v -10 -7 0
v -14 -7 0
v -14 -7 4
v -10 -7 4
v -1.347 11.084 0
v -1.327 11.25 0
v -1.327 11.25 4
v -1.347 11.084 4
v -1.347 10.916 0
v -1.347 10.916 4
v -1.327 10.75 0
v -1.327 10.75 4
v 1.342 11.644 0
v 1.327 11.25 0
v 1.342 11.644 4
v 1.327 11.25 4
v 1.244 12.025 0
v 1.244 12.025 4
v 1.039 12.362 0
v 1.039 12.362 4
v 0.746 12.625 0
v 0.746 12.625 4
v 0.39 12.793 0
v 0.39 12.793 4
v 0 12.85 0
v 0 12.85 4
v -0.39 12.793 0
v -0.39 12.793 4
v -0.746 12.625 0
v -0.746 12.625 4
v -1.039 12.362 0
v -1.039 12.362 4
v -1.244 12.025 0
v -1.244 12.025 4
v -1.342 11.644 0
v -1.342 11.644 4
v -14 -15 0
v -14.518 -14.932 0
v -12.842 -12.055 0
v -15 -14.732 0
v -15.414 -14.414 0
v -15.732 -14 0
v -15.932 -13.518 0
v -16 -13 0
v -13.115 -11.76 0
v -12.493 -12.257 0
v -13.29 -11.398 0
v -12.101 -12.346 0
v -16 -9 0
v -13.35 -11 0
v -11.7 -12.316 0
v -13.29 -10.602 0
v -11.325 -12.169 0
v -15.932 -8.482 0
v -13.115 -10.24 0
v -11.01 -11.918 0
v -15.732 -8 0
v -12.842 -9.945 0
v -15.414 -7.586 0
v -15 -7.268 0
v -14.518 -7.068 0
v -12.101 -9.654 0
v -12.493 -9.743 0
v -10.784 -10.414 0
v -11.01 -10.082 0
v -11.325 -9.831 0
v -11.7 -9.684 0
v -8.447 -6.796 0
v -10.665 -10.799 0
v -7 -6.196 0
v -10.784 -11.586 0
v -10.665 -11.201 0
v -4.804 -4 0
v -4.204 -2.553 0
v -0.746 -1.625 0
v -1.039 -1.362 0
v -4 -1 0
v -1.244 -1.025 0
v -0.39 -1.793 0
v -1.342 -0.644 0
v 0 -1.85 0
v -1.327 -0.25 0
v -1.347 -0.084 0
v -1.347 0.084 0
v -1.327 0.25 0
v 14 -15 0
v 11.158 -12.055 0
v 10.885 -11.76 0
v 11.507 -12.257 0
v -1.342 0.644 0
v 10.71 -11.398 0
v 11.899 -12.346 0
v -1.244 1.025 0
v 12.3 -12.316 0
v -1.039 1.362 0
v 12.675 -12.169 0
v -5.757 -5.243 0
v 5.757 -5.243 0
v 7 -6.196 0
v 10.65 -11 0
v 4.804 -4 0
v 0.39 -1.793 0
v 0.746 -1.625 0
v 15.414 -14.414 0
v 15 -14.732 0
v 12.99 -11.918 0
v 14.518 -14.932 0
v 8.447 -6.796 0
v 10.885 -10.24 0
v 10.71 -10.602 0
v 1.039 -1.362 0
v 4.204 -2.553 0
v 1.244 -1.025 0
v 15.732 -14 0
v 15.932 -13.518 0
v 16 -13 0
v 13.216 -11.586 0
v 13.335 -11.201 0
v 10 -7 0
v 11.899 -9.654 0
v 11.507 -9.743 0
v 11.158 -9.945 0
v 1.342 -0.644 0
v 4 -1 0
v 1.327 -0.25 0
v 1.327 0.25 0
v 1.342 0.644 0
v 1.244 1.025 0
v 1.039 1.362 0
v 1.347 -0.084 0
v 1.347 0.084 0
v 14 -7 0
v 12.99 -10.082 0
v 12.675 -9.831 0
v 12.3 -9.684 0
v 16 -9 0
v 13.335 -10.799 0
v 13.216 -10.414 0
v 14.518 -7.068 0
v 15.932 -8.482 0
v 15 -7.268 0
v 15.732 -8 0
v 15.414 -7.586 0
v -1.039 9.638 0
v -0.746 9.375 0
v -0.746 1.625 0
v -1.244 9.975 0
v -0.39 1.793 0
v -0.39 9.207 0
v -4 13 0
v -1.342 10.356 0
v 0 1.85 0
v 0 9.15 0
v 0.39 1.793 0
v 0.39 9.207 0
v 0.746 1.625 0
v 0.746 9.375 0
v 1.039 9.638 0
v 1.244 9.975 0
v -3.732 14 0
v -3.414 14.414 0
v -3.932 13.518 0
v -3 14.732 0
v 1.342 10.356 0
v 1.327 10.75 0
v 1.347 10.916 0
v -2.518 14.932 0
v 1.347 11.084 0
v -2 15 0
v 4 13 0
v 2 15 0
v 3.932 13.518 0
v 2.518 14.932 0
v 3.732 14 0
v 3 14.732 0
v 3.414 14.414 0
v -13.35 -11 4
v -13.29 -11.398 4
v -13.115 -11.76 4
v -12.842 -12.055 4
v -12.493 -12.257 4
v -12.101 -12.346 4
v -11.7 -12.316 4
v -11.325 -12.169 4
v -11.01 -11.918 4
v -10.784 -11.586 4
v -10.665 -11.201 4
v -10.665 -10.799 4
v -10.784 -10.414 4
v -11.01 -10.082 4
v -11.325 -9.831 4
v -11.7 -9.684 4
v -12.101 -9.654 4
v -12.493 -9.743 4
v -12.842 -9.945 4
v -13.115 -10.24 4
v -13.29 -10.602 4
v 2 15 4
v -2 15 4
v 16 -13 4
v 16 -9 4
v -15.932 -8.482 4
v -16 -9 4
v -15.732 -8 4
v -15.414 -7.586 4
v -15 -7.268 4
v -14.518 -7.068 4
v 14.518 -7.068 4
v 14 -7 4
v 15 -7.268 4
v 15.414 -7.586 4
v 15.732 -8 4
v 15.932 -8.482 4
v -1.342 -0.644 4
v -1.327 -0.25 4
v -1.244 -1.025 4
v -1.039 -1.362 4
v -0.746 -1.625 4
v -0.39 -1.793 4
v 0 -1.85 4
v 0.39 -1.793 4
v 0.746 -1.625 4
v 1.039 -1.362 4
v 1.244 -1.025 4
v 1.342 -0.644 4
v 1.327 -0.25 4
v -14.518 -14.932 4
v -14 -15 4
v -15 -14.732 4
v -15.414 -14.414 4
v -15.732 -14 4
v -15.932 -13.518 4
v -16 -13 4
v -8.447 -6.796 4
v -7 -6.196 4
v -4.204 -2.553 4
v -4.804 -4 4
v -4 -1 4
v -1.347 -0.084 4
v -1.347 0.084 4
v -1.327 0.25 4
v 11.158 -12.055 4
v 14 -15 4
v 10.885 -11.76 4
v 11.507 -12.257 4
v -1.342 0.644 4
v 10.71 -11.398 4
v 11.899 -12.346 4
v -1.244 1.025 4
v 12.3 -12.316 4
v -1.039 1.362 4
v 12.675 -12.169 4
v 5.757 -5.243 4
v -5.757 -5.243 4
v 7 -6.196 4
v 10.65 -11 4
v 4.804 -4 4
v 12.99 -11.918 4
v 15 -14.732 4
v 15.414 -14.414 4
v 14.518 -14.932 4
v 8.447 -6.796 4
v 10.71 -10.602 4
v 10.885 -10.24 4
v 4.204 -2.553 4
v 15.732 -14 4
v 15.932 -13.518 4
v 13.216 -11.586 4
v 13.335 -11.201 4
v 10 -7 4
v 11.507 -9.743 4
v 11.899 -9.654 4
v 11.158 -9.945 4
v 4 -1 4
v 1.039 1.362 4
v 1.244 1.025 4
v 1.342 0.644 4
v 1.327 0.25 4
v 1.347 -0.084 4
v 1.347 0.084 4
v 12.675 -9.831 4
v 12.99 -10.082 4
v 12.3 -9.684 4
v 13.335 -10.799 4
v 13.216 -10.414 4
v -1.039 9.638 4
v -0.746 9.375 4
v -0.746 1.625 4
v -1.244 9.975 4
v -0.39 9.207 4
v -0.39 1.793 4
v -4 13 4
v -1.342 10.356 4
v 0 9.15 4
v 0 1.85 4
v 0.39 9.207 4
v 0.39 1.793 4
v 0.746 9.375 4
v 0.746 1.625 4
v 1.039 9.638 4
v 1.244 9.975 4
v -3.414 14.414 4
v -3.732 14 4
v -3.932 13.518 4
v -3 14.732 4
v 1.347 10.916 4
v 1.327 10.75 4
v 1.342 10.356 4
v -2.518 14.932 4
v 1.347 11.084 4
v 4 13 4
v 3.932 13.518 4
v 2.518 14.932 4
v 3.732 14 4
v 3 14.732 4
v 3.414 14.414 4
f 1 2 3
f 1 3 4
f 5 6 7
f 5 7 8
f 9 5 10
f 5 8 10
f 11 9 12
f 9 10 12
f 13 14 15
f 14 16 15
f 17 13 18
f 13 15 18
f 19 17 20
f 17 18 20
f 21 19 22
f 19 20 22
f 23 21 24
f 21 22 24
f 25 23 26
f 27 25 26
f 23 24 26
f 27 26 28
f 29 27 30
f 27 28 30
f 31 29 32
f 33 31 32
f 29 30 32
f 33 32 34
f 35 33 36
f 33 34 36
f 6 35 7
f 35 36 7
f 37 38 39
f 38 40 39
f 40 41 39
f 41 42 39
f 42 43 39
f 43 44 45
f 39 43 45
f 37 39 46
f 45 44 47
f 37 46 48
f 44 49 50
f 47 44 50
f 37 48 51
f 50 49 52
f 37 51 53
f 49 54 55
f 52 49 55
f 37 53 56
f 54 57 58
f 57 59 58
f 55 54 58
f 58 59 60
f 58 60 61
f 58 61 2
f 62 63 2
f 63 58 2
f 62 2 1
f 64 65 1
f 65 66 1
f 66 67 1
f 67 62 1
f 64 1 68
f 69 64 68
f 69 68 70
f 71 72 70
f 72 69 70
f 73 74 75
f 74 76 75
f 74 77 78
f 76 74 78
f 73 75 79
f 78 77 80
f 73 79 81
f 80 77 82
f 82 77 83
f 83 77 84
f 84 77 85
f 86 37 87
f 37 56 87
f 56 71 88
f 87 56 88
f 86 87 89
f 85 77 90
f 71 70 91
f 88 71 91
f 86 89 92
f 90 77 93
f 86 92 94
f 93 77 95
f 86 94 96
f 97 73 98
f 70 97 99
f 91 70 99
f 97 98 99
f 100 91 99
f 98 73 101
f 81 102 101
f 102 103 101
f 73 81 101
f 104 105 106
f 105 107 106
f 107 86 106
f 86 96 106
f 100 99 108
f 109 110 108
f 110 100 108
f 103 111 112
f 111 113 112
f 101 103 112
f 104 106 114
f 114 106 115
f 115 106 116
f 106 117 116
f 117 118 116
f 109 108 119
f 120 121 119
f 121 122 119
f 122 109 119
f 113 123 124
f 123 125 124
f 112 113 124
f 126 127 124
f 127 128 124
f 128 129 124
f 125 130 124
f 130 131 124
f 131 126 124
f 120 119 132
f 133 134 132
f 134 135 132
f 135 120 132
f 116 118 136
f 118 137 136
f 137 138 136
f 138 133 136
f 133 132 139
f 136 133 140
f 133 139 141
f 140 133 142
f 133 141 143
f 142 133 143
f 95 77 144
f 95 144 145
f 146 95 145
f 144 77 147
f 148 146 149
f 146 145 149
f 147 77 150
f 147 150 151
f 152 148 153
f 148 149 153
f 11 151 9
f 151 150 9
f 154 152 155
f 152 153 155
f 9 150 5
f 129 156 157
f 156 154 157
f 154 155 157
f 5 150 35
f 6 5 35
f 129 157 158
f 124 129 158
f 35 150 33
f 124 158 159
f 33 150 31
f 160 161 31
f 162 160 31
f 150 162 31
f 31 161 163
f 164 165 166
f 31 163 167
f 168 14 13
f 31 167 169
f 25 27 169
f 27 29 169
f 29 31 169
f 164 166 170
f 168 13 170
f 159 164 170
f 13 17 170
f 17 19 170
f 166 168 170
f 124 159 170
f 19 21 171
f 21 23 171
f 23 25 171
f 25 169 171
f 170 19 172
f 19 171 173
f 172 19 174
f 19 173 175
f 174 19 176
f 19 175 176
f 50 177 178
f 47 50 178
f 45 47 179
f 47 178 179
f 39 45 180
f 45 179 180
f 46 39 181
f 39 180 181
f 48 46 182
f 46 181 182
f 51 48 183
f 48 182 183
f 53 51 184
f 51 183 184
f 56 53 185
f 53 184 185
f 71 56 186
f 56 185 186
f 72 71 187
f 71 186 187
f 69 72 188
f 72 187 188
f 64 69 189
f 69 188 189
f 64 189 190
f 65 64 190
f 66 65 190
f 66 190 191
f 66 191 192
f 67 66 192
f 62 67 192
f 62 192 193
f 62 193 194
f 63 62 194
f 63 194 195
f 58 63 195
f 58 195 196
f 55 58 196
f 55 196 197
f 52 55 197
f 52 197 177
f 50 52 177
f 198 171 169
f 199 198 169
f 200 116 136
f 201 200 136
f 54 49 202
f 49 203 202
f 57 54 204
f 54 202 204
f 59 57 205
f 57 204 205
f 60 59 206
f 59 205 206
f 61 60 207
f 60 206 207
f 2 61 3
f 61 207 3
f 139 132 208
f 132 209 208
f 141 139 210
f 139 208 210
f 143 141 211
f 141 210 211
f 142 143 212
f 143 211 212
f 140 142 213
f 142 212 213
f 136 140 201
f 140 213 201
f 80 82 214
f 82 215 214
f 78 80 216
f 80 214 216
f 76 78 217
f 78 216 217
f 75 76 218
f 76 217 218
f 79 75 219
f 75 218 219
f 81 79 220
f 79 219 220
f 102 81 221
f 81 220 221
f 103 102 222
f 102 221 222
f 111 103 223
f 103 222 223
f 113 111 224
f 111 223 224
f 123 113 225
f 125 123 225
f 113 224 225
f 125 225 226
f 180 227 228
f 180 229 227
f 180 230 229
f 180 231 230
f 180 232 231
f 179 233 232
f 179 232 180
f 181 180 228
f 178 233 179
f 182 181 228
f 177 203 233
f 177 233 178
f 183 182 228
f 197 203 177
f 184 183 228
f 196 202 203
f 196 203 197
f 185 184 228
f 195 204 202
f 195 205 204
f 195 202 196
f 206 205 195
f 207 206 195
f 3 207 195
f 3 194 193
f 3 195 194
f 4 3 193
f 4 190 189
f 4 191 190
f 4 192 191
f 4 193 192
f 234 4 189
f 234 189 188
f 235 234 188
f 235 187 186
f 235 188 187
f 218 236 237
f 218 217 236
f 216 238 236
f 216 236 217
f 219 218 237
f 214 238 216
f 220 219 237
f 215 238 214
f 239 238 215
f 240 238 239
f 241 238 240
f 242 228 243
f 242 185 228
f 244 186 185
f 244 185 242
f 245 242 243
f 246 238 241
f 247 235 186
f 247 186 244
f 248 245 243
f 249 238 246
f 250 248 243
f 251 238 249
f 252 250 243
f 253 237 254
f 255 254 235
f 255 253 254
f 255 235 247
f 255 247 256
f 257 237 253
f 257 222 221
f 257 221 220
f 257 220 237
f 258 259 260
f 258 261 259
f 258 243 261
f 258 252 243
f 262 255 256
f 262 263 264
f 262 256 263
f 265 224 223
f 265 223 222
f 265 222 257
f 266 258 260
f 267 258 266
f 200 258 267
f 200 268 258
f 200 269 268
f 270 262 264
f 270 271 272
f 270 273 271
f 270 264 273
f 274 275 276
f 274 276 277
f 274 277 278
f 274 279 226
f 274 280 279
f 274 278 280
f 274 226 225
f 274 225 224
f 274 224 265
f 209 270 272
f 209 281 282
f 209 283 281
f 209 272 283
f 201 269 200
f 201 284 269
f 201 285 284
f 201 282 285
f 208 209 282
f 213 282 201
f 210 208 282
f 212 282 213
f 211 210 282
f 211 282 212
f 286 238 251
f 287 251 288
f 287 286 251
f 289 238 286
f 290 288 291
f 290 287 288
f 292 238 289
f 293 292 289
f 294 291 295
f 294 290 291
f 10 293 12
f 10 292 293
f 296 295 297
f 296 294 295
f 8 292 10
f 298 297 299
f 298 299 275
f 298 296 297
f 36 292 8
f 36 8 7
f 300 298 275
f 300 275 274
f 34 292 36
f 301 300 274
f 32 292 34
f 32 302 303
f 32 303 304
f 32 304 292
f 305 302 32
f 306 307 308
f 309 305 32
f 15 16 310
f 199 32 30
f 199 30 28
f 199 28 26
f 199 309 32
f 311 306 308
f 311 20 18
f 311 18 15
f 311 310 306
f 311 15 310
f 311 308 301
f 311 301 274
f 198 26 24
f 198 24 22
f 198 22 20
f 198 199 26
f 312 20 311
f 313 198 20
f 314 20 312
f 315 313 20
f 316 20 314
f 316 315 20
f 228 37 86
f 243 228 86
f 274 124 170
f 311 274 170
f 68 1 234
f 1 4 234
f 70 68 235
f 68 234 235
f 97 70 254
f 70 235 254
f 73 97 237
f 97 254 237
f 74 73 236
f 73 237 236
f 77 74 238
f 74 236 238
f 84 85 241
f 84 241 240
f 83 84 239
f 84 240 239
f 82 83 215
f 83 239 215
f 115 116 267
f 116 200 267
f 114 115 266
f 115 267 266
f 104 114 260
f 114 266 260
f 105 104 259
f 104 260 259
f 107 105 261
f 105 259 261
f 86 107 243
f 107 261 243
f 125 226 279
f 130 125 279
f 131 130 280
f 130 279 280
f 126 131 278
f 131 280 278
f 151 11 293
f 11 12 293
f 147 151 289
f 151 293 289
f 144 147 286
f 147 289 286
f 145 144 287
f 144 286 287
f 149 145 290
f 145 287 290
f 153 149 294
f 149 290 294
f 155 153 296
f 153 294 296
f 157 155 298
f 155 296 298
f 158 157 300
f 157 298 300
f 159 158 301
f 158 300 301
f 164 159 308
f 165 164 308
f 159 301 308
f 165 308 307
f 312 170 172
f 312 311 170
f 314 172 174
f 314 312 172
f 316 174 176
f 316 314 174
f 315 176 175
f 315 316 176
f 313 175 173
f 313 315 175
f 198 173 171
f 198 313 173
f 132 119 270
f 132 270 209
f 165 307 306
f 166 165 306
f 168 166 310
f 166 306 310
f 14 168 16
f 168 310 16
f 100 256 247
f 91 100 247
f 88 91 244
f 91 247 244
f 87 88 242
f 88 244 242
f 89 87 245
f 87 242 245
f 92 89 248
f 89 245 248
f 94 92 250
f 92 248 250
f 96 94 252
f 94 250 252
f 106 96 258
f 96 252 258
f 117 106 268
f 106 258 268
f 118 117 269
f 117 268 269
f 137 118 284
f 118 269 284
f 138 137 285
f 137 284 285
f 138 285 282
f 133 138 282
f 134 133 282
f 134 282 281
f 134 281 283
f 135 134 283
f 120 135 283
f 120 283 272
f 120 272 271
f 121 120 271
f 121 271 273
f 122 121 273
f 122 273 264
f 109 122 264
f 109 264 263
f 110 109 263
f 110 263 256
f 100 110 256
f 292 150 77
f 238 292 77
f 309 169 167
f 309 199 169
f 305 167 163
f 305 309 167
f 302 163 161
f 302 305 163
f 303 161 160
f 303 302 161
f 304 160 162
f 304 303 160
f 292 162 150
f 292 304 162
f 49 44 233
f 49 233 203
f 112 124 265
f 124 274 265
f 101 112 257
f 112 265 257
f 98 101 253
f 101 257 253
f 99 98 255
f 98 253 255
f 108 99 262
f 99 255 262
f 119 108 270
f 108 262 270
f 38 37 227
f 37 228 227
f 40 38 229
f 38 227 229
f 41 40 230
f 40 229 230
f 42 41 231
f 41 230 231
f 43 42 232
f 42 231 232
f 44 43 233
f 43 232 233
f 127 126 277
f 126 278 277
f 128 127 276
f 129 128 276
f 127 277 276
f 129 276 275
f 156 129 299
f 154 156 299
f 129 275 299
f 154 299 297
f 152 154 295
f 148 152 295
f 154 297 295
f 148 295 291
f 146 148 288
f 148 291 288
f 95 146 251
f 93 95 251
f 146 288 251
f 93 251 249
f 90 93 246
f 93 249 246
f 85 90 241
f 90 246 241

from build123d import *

# Parameters (mm, degrees)
F0_W     = 12
F0_H     = 8
F1_DEPTH = 4
F2_D     = 2.7
F3_R     = 6
F4_R     = 2


with BuildPart() as f1:
    # F0 (on Top) → F1 (new body)
    with BuildSketch(Plane.XY):
        Polygon((-4, -15), (4, -15), (4, -7), (4, 15), (-4, 15), (-4, -7), align=None)
        with Locations((10, -11)):
            Rectangle(F0_W, F0_H)
        with Locations((-10, -11)):
            Rectangle(F0_W, F0_H)
    extrude(amount=F1_DEPTH)

    # F2 (through all)
    with Locations(Plane(origin=(0, 0, 0), x_dir=(1, 0, 0), z_dir=(0, 0, -1))):
        with Locations((0, -11), (12, 11), (0, 0), (-12, 11), (0, -10.5), (0, -11.5), (0, -0.5), (0, 0.5)):
            Hole(F2_D / 2)

    # F3
    f3_edges = [f1.edges().sort_by_distance(p)[0] for p in [
        (-4, -7, 2),
        (4, -7, 2),
    ]]
    fillet(f3_edges, radius=F3_R)

    # F4
    f4_edges = [f1.edges().sort_by_distance(p)[0] for p in [
        (-4, 15, 2),
        (4, 15, 2),
        (16, -7, 2),
        (16, -15, 2),
        (-16, -7, 2),
        (-16, -15, 2),
    ]]
    fillet(f4_edges, radius=F4_R)


solid = f1.part
